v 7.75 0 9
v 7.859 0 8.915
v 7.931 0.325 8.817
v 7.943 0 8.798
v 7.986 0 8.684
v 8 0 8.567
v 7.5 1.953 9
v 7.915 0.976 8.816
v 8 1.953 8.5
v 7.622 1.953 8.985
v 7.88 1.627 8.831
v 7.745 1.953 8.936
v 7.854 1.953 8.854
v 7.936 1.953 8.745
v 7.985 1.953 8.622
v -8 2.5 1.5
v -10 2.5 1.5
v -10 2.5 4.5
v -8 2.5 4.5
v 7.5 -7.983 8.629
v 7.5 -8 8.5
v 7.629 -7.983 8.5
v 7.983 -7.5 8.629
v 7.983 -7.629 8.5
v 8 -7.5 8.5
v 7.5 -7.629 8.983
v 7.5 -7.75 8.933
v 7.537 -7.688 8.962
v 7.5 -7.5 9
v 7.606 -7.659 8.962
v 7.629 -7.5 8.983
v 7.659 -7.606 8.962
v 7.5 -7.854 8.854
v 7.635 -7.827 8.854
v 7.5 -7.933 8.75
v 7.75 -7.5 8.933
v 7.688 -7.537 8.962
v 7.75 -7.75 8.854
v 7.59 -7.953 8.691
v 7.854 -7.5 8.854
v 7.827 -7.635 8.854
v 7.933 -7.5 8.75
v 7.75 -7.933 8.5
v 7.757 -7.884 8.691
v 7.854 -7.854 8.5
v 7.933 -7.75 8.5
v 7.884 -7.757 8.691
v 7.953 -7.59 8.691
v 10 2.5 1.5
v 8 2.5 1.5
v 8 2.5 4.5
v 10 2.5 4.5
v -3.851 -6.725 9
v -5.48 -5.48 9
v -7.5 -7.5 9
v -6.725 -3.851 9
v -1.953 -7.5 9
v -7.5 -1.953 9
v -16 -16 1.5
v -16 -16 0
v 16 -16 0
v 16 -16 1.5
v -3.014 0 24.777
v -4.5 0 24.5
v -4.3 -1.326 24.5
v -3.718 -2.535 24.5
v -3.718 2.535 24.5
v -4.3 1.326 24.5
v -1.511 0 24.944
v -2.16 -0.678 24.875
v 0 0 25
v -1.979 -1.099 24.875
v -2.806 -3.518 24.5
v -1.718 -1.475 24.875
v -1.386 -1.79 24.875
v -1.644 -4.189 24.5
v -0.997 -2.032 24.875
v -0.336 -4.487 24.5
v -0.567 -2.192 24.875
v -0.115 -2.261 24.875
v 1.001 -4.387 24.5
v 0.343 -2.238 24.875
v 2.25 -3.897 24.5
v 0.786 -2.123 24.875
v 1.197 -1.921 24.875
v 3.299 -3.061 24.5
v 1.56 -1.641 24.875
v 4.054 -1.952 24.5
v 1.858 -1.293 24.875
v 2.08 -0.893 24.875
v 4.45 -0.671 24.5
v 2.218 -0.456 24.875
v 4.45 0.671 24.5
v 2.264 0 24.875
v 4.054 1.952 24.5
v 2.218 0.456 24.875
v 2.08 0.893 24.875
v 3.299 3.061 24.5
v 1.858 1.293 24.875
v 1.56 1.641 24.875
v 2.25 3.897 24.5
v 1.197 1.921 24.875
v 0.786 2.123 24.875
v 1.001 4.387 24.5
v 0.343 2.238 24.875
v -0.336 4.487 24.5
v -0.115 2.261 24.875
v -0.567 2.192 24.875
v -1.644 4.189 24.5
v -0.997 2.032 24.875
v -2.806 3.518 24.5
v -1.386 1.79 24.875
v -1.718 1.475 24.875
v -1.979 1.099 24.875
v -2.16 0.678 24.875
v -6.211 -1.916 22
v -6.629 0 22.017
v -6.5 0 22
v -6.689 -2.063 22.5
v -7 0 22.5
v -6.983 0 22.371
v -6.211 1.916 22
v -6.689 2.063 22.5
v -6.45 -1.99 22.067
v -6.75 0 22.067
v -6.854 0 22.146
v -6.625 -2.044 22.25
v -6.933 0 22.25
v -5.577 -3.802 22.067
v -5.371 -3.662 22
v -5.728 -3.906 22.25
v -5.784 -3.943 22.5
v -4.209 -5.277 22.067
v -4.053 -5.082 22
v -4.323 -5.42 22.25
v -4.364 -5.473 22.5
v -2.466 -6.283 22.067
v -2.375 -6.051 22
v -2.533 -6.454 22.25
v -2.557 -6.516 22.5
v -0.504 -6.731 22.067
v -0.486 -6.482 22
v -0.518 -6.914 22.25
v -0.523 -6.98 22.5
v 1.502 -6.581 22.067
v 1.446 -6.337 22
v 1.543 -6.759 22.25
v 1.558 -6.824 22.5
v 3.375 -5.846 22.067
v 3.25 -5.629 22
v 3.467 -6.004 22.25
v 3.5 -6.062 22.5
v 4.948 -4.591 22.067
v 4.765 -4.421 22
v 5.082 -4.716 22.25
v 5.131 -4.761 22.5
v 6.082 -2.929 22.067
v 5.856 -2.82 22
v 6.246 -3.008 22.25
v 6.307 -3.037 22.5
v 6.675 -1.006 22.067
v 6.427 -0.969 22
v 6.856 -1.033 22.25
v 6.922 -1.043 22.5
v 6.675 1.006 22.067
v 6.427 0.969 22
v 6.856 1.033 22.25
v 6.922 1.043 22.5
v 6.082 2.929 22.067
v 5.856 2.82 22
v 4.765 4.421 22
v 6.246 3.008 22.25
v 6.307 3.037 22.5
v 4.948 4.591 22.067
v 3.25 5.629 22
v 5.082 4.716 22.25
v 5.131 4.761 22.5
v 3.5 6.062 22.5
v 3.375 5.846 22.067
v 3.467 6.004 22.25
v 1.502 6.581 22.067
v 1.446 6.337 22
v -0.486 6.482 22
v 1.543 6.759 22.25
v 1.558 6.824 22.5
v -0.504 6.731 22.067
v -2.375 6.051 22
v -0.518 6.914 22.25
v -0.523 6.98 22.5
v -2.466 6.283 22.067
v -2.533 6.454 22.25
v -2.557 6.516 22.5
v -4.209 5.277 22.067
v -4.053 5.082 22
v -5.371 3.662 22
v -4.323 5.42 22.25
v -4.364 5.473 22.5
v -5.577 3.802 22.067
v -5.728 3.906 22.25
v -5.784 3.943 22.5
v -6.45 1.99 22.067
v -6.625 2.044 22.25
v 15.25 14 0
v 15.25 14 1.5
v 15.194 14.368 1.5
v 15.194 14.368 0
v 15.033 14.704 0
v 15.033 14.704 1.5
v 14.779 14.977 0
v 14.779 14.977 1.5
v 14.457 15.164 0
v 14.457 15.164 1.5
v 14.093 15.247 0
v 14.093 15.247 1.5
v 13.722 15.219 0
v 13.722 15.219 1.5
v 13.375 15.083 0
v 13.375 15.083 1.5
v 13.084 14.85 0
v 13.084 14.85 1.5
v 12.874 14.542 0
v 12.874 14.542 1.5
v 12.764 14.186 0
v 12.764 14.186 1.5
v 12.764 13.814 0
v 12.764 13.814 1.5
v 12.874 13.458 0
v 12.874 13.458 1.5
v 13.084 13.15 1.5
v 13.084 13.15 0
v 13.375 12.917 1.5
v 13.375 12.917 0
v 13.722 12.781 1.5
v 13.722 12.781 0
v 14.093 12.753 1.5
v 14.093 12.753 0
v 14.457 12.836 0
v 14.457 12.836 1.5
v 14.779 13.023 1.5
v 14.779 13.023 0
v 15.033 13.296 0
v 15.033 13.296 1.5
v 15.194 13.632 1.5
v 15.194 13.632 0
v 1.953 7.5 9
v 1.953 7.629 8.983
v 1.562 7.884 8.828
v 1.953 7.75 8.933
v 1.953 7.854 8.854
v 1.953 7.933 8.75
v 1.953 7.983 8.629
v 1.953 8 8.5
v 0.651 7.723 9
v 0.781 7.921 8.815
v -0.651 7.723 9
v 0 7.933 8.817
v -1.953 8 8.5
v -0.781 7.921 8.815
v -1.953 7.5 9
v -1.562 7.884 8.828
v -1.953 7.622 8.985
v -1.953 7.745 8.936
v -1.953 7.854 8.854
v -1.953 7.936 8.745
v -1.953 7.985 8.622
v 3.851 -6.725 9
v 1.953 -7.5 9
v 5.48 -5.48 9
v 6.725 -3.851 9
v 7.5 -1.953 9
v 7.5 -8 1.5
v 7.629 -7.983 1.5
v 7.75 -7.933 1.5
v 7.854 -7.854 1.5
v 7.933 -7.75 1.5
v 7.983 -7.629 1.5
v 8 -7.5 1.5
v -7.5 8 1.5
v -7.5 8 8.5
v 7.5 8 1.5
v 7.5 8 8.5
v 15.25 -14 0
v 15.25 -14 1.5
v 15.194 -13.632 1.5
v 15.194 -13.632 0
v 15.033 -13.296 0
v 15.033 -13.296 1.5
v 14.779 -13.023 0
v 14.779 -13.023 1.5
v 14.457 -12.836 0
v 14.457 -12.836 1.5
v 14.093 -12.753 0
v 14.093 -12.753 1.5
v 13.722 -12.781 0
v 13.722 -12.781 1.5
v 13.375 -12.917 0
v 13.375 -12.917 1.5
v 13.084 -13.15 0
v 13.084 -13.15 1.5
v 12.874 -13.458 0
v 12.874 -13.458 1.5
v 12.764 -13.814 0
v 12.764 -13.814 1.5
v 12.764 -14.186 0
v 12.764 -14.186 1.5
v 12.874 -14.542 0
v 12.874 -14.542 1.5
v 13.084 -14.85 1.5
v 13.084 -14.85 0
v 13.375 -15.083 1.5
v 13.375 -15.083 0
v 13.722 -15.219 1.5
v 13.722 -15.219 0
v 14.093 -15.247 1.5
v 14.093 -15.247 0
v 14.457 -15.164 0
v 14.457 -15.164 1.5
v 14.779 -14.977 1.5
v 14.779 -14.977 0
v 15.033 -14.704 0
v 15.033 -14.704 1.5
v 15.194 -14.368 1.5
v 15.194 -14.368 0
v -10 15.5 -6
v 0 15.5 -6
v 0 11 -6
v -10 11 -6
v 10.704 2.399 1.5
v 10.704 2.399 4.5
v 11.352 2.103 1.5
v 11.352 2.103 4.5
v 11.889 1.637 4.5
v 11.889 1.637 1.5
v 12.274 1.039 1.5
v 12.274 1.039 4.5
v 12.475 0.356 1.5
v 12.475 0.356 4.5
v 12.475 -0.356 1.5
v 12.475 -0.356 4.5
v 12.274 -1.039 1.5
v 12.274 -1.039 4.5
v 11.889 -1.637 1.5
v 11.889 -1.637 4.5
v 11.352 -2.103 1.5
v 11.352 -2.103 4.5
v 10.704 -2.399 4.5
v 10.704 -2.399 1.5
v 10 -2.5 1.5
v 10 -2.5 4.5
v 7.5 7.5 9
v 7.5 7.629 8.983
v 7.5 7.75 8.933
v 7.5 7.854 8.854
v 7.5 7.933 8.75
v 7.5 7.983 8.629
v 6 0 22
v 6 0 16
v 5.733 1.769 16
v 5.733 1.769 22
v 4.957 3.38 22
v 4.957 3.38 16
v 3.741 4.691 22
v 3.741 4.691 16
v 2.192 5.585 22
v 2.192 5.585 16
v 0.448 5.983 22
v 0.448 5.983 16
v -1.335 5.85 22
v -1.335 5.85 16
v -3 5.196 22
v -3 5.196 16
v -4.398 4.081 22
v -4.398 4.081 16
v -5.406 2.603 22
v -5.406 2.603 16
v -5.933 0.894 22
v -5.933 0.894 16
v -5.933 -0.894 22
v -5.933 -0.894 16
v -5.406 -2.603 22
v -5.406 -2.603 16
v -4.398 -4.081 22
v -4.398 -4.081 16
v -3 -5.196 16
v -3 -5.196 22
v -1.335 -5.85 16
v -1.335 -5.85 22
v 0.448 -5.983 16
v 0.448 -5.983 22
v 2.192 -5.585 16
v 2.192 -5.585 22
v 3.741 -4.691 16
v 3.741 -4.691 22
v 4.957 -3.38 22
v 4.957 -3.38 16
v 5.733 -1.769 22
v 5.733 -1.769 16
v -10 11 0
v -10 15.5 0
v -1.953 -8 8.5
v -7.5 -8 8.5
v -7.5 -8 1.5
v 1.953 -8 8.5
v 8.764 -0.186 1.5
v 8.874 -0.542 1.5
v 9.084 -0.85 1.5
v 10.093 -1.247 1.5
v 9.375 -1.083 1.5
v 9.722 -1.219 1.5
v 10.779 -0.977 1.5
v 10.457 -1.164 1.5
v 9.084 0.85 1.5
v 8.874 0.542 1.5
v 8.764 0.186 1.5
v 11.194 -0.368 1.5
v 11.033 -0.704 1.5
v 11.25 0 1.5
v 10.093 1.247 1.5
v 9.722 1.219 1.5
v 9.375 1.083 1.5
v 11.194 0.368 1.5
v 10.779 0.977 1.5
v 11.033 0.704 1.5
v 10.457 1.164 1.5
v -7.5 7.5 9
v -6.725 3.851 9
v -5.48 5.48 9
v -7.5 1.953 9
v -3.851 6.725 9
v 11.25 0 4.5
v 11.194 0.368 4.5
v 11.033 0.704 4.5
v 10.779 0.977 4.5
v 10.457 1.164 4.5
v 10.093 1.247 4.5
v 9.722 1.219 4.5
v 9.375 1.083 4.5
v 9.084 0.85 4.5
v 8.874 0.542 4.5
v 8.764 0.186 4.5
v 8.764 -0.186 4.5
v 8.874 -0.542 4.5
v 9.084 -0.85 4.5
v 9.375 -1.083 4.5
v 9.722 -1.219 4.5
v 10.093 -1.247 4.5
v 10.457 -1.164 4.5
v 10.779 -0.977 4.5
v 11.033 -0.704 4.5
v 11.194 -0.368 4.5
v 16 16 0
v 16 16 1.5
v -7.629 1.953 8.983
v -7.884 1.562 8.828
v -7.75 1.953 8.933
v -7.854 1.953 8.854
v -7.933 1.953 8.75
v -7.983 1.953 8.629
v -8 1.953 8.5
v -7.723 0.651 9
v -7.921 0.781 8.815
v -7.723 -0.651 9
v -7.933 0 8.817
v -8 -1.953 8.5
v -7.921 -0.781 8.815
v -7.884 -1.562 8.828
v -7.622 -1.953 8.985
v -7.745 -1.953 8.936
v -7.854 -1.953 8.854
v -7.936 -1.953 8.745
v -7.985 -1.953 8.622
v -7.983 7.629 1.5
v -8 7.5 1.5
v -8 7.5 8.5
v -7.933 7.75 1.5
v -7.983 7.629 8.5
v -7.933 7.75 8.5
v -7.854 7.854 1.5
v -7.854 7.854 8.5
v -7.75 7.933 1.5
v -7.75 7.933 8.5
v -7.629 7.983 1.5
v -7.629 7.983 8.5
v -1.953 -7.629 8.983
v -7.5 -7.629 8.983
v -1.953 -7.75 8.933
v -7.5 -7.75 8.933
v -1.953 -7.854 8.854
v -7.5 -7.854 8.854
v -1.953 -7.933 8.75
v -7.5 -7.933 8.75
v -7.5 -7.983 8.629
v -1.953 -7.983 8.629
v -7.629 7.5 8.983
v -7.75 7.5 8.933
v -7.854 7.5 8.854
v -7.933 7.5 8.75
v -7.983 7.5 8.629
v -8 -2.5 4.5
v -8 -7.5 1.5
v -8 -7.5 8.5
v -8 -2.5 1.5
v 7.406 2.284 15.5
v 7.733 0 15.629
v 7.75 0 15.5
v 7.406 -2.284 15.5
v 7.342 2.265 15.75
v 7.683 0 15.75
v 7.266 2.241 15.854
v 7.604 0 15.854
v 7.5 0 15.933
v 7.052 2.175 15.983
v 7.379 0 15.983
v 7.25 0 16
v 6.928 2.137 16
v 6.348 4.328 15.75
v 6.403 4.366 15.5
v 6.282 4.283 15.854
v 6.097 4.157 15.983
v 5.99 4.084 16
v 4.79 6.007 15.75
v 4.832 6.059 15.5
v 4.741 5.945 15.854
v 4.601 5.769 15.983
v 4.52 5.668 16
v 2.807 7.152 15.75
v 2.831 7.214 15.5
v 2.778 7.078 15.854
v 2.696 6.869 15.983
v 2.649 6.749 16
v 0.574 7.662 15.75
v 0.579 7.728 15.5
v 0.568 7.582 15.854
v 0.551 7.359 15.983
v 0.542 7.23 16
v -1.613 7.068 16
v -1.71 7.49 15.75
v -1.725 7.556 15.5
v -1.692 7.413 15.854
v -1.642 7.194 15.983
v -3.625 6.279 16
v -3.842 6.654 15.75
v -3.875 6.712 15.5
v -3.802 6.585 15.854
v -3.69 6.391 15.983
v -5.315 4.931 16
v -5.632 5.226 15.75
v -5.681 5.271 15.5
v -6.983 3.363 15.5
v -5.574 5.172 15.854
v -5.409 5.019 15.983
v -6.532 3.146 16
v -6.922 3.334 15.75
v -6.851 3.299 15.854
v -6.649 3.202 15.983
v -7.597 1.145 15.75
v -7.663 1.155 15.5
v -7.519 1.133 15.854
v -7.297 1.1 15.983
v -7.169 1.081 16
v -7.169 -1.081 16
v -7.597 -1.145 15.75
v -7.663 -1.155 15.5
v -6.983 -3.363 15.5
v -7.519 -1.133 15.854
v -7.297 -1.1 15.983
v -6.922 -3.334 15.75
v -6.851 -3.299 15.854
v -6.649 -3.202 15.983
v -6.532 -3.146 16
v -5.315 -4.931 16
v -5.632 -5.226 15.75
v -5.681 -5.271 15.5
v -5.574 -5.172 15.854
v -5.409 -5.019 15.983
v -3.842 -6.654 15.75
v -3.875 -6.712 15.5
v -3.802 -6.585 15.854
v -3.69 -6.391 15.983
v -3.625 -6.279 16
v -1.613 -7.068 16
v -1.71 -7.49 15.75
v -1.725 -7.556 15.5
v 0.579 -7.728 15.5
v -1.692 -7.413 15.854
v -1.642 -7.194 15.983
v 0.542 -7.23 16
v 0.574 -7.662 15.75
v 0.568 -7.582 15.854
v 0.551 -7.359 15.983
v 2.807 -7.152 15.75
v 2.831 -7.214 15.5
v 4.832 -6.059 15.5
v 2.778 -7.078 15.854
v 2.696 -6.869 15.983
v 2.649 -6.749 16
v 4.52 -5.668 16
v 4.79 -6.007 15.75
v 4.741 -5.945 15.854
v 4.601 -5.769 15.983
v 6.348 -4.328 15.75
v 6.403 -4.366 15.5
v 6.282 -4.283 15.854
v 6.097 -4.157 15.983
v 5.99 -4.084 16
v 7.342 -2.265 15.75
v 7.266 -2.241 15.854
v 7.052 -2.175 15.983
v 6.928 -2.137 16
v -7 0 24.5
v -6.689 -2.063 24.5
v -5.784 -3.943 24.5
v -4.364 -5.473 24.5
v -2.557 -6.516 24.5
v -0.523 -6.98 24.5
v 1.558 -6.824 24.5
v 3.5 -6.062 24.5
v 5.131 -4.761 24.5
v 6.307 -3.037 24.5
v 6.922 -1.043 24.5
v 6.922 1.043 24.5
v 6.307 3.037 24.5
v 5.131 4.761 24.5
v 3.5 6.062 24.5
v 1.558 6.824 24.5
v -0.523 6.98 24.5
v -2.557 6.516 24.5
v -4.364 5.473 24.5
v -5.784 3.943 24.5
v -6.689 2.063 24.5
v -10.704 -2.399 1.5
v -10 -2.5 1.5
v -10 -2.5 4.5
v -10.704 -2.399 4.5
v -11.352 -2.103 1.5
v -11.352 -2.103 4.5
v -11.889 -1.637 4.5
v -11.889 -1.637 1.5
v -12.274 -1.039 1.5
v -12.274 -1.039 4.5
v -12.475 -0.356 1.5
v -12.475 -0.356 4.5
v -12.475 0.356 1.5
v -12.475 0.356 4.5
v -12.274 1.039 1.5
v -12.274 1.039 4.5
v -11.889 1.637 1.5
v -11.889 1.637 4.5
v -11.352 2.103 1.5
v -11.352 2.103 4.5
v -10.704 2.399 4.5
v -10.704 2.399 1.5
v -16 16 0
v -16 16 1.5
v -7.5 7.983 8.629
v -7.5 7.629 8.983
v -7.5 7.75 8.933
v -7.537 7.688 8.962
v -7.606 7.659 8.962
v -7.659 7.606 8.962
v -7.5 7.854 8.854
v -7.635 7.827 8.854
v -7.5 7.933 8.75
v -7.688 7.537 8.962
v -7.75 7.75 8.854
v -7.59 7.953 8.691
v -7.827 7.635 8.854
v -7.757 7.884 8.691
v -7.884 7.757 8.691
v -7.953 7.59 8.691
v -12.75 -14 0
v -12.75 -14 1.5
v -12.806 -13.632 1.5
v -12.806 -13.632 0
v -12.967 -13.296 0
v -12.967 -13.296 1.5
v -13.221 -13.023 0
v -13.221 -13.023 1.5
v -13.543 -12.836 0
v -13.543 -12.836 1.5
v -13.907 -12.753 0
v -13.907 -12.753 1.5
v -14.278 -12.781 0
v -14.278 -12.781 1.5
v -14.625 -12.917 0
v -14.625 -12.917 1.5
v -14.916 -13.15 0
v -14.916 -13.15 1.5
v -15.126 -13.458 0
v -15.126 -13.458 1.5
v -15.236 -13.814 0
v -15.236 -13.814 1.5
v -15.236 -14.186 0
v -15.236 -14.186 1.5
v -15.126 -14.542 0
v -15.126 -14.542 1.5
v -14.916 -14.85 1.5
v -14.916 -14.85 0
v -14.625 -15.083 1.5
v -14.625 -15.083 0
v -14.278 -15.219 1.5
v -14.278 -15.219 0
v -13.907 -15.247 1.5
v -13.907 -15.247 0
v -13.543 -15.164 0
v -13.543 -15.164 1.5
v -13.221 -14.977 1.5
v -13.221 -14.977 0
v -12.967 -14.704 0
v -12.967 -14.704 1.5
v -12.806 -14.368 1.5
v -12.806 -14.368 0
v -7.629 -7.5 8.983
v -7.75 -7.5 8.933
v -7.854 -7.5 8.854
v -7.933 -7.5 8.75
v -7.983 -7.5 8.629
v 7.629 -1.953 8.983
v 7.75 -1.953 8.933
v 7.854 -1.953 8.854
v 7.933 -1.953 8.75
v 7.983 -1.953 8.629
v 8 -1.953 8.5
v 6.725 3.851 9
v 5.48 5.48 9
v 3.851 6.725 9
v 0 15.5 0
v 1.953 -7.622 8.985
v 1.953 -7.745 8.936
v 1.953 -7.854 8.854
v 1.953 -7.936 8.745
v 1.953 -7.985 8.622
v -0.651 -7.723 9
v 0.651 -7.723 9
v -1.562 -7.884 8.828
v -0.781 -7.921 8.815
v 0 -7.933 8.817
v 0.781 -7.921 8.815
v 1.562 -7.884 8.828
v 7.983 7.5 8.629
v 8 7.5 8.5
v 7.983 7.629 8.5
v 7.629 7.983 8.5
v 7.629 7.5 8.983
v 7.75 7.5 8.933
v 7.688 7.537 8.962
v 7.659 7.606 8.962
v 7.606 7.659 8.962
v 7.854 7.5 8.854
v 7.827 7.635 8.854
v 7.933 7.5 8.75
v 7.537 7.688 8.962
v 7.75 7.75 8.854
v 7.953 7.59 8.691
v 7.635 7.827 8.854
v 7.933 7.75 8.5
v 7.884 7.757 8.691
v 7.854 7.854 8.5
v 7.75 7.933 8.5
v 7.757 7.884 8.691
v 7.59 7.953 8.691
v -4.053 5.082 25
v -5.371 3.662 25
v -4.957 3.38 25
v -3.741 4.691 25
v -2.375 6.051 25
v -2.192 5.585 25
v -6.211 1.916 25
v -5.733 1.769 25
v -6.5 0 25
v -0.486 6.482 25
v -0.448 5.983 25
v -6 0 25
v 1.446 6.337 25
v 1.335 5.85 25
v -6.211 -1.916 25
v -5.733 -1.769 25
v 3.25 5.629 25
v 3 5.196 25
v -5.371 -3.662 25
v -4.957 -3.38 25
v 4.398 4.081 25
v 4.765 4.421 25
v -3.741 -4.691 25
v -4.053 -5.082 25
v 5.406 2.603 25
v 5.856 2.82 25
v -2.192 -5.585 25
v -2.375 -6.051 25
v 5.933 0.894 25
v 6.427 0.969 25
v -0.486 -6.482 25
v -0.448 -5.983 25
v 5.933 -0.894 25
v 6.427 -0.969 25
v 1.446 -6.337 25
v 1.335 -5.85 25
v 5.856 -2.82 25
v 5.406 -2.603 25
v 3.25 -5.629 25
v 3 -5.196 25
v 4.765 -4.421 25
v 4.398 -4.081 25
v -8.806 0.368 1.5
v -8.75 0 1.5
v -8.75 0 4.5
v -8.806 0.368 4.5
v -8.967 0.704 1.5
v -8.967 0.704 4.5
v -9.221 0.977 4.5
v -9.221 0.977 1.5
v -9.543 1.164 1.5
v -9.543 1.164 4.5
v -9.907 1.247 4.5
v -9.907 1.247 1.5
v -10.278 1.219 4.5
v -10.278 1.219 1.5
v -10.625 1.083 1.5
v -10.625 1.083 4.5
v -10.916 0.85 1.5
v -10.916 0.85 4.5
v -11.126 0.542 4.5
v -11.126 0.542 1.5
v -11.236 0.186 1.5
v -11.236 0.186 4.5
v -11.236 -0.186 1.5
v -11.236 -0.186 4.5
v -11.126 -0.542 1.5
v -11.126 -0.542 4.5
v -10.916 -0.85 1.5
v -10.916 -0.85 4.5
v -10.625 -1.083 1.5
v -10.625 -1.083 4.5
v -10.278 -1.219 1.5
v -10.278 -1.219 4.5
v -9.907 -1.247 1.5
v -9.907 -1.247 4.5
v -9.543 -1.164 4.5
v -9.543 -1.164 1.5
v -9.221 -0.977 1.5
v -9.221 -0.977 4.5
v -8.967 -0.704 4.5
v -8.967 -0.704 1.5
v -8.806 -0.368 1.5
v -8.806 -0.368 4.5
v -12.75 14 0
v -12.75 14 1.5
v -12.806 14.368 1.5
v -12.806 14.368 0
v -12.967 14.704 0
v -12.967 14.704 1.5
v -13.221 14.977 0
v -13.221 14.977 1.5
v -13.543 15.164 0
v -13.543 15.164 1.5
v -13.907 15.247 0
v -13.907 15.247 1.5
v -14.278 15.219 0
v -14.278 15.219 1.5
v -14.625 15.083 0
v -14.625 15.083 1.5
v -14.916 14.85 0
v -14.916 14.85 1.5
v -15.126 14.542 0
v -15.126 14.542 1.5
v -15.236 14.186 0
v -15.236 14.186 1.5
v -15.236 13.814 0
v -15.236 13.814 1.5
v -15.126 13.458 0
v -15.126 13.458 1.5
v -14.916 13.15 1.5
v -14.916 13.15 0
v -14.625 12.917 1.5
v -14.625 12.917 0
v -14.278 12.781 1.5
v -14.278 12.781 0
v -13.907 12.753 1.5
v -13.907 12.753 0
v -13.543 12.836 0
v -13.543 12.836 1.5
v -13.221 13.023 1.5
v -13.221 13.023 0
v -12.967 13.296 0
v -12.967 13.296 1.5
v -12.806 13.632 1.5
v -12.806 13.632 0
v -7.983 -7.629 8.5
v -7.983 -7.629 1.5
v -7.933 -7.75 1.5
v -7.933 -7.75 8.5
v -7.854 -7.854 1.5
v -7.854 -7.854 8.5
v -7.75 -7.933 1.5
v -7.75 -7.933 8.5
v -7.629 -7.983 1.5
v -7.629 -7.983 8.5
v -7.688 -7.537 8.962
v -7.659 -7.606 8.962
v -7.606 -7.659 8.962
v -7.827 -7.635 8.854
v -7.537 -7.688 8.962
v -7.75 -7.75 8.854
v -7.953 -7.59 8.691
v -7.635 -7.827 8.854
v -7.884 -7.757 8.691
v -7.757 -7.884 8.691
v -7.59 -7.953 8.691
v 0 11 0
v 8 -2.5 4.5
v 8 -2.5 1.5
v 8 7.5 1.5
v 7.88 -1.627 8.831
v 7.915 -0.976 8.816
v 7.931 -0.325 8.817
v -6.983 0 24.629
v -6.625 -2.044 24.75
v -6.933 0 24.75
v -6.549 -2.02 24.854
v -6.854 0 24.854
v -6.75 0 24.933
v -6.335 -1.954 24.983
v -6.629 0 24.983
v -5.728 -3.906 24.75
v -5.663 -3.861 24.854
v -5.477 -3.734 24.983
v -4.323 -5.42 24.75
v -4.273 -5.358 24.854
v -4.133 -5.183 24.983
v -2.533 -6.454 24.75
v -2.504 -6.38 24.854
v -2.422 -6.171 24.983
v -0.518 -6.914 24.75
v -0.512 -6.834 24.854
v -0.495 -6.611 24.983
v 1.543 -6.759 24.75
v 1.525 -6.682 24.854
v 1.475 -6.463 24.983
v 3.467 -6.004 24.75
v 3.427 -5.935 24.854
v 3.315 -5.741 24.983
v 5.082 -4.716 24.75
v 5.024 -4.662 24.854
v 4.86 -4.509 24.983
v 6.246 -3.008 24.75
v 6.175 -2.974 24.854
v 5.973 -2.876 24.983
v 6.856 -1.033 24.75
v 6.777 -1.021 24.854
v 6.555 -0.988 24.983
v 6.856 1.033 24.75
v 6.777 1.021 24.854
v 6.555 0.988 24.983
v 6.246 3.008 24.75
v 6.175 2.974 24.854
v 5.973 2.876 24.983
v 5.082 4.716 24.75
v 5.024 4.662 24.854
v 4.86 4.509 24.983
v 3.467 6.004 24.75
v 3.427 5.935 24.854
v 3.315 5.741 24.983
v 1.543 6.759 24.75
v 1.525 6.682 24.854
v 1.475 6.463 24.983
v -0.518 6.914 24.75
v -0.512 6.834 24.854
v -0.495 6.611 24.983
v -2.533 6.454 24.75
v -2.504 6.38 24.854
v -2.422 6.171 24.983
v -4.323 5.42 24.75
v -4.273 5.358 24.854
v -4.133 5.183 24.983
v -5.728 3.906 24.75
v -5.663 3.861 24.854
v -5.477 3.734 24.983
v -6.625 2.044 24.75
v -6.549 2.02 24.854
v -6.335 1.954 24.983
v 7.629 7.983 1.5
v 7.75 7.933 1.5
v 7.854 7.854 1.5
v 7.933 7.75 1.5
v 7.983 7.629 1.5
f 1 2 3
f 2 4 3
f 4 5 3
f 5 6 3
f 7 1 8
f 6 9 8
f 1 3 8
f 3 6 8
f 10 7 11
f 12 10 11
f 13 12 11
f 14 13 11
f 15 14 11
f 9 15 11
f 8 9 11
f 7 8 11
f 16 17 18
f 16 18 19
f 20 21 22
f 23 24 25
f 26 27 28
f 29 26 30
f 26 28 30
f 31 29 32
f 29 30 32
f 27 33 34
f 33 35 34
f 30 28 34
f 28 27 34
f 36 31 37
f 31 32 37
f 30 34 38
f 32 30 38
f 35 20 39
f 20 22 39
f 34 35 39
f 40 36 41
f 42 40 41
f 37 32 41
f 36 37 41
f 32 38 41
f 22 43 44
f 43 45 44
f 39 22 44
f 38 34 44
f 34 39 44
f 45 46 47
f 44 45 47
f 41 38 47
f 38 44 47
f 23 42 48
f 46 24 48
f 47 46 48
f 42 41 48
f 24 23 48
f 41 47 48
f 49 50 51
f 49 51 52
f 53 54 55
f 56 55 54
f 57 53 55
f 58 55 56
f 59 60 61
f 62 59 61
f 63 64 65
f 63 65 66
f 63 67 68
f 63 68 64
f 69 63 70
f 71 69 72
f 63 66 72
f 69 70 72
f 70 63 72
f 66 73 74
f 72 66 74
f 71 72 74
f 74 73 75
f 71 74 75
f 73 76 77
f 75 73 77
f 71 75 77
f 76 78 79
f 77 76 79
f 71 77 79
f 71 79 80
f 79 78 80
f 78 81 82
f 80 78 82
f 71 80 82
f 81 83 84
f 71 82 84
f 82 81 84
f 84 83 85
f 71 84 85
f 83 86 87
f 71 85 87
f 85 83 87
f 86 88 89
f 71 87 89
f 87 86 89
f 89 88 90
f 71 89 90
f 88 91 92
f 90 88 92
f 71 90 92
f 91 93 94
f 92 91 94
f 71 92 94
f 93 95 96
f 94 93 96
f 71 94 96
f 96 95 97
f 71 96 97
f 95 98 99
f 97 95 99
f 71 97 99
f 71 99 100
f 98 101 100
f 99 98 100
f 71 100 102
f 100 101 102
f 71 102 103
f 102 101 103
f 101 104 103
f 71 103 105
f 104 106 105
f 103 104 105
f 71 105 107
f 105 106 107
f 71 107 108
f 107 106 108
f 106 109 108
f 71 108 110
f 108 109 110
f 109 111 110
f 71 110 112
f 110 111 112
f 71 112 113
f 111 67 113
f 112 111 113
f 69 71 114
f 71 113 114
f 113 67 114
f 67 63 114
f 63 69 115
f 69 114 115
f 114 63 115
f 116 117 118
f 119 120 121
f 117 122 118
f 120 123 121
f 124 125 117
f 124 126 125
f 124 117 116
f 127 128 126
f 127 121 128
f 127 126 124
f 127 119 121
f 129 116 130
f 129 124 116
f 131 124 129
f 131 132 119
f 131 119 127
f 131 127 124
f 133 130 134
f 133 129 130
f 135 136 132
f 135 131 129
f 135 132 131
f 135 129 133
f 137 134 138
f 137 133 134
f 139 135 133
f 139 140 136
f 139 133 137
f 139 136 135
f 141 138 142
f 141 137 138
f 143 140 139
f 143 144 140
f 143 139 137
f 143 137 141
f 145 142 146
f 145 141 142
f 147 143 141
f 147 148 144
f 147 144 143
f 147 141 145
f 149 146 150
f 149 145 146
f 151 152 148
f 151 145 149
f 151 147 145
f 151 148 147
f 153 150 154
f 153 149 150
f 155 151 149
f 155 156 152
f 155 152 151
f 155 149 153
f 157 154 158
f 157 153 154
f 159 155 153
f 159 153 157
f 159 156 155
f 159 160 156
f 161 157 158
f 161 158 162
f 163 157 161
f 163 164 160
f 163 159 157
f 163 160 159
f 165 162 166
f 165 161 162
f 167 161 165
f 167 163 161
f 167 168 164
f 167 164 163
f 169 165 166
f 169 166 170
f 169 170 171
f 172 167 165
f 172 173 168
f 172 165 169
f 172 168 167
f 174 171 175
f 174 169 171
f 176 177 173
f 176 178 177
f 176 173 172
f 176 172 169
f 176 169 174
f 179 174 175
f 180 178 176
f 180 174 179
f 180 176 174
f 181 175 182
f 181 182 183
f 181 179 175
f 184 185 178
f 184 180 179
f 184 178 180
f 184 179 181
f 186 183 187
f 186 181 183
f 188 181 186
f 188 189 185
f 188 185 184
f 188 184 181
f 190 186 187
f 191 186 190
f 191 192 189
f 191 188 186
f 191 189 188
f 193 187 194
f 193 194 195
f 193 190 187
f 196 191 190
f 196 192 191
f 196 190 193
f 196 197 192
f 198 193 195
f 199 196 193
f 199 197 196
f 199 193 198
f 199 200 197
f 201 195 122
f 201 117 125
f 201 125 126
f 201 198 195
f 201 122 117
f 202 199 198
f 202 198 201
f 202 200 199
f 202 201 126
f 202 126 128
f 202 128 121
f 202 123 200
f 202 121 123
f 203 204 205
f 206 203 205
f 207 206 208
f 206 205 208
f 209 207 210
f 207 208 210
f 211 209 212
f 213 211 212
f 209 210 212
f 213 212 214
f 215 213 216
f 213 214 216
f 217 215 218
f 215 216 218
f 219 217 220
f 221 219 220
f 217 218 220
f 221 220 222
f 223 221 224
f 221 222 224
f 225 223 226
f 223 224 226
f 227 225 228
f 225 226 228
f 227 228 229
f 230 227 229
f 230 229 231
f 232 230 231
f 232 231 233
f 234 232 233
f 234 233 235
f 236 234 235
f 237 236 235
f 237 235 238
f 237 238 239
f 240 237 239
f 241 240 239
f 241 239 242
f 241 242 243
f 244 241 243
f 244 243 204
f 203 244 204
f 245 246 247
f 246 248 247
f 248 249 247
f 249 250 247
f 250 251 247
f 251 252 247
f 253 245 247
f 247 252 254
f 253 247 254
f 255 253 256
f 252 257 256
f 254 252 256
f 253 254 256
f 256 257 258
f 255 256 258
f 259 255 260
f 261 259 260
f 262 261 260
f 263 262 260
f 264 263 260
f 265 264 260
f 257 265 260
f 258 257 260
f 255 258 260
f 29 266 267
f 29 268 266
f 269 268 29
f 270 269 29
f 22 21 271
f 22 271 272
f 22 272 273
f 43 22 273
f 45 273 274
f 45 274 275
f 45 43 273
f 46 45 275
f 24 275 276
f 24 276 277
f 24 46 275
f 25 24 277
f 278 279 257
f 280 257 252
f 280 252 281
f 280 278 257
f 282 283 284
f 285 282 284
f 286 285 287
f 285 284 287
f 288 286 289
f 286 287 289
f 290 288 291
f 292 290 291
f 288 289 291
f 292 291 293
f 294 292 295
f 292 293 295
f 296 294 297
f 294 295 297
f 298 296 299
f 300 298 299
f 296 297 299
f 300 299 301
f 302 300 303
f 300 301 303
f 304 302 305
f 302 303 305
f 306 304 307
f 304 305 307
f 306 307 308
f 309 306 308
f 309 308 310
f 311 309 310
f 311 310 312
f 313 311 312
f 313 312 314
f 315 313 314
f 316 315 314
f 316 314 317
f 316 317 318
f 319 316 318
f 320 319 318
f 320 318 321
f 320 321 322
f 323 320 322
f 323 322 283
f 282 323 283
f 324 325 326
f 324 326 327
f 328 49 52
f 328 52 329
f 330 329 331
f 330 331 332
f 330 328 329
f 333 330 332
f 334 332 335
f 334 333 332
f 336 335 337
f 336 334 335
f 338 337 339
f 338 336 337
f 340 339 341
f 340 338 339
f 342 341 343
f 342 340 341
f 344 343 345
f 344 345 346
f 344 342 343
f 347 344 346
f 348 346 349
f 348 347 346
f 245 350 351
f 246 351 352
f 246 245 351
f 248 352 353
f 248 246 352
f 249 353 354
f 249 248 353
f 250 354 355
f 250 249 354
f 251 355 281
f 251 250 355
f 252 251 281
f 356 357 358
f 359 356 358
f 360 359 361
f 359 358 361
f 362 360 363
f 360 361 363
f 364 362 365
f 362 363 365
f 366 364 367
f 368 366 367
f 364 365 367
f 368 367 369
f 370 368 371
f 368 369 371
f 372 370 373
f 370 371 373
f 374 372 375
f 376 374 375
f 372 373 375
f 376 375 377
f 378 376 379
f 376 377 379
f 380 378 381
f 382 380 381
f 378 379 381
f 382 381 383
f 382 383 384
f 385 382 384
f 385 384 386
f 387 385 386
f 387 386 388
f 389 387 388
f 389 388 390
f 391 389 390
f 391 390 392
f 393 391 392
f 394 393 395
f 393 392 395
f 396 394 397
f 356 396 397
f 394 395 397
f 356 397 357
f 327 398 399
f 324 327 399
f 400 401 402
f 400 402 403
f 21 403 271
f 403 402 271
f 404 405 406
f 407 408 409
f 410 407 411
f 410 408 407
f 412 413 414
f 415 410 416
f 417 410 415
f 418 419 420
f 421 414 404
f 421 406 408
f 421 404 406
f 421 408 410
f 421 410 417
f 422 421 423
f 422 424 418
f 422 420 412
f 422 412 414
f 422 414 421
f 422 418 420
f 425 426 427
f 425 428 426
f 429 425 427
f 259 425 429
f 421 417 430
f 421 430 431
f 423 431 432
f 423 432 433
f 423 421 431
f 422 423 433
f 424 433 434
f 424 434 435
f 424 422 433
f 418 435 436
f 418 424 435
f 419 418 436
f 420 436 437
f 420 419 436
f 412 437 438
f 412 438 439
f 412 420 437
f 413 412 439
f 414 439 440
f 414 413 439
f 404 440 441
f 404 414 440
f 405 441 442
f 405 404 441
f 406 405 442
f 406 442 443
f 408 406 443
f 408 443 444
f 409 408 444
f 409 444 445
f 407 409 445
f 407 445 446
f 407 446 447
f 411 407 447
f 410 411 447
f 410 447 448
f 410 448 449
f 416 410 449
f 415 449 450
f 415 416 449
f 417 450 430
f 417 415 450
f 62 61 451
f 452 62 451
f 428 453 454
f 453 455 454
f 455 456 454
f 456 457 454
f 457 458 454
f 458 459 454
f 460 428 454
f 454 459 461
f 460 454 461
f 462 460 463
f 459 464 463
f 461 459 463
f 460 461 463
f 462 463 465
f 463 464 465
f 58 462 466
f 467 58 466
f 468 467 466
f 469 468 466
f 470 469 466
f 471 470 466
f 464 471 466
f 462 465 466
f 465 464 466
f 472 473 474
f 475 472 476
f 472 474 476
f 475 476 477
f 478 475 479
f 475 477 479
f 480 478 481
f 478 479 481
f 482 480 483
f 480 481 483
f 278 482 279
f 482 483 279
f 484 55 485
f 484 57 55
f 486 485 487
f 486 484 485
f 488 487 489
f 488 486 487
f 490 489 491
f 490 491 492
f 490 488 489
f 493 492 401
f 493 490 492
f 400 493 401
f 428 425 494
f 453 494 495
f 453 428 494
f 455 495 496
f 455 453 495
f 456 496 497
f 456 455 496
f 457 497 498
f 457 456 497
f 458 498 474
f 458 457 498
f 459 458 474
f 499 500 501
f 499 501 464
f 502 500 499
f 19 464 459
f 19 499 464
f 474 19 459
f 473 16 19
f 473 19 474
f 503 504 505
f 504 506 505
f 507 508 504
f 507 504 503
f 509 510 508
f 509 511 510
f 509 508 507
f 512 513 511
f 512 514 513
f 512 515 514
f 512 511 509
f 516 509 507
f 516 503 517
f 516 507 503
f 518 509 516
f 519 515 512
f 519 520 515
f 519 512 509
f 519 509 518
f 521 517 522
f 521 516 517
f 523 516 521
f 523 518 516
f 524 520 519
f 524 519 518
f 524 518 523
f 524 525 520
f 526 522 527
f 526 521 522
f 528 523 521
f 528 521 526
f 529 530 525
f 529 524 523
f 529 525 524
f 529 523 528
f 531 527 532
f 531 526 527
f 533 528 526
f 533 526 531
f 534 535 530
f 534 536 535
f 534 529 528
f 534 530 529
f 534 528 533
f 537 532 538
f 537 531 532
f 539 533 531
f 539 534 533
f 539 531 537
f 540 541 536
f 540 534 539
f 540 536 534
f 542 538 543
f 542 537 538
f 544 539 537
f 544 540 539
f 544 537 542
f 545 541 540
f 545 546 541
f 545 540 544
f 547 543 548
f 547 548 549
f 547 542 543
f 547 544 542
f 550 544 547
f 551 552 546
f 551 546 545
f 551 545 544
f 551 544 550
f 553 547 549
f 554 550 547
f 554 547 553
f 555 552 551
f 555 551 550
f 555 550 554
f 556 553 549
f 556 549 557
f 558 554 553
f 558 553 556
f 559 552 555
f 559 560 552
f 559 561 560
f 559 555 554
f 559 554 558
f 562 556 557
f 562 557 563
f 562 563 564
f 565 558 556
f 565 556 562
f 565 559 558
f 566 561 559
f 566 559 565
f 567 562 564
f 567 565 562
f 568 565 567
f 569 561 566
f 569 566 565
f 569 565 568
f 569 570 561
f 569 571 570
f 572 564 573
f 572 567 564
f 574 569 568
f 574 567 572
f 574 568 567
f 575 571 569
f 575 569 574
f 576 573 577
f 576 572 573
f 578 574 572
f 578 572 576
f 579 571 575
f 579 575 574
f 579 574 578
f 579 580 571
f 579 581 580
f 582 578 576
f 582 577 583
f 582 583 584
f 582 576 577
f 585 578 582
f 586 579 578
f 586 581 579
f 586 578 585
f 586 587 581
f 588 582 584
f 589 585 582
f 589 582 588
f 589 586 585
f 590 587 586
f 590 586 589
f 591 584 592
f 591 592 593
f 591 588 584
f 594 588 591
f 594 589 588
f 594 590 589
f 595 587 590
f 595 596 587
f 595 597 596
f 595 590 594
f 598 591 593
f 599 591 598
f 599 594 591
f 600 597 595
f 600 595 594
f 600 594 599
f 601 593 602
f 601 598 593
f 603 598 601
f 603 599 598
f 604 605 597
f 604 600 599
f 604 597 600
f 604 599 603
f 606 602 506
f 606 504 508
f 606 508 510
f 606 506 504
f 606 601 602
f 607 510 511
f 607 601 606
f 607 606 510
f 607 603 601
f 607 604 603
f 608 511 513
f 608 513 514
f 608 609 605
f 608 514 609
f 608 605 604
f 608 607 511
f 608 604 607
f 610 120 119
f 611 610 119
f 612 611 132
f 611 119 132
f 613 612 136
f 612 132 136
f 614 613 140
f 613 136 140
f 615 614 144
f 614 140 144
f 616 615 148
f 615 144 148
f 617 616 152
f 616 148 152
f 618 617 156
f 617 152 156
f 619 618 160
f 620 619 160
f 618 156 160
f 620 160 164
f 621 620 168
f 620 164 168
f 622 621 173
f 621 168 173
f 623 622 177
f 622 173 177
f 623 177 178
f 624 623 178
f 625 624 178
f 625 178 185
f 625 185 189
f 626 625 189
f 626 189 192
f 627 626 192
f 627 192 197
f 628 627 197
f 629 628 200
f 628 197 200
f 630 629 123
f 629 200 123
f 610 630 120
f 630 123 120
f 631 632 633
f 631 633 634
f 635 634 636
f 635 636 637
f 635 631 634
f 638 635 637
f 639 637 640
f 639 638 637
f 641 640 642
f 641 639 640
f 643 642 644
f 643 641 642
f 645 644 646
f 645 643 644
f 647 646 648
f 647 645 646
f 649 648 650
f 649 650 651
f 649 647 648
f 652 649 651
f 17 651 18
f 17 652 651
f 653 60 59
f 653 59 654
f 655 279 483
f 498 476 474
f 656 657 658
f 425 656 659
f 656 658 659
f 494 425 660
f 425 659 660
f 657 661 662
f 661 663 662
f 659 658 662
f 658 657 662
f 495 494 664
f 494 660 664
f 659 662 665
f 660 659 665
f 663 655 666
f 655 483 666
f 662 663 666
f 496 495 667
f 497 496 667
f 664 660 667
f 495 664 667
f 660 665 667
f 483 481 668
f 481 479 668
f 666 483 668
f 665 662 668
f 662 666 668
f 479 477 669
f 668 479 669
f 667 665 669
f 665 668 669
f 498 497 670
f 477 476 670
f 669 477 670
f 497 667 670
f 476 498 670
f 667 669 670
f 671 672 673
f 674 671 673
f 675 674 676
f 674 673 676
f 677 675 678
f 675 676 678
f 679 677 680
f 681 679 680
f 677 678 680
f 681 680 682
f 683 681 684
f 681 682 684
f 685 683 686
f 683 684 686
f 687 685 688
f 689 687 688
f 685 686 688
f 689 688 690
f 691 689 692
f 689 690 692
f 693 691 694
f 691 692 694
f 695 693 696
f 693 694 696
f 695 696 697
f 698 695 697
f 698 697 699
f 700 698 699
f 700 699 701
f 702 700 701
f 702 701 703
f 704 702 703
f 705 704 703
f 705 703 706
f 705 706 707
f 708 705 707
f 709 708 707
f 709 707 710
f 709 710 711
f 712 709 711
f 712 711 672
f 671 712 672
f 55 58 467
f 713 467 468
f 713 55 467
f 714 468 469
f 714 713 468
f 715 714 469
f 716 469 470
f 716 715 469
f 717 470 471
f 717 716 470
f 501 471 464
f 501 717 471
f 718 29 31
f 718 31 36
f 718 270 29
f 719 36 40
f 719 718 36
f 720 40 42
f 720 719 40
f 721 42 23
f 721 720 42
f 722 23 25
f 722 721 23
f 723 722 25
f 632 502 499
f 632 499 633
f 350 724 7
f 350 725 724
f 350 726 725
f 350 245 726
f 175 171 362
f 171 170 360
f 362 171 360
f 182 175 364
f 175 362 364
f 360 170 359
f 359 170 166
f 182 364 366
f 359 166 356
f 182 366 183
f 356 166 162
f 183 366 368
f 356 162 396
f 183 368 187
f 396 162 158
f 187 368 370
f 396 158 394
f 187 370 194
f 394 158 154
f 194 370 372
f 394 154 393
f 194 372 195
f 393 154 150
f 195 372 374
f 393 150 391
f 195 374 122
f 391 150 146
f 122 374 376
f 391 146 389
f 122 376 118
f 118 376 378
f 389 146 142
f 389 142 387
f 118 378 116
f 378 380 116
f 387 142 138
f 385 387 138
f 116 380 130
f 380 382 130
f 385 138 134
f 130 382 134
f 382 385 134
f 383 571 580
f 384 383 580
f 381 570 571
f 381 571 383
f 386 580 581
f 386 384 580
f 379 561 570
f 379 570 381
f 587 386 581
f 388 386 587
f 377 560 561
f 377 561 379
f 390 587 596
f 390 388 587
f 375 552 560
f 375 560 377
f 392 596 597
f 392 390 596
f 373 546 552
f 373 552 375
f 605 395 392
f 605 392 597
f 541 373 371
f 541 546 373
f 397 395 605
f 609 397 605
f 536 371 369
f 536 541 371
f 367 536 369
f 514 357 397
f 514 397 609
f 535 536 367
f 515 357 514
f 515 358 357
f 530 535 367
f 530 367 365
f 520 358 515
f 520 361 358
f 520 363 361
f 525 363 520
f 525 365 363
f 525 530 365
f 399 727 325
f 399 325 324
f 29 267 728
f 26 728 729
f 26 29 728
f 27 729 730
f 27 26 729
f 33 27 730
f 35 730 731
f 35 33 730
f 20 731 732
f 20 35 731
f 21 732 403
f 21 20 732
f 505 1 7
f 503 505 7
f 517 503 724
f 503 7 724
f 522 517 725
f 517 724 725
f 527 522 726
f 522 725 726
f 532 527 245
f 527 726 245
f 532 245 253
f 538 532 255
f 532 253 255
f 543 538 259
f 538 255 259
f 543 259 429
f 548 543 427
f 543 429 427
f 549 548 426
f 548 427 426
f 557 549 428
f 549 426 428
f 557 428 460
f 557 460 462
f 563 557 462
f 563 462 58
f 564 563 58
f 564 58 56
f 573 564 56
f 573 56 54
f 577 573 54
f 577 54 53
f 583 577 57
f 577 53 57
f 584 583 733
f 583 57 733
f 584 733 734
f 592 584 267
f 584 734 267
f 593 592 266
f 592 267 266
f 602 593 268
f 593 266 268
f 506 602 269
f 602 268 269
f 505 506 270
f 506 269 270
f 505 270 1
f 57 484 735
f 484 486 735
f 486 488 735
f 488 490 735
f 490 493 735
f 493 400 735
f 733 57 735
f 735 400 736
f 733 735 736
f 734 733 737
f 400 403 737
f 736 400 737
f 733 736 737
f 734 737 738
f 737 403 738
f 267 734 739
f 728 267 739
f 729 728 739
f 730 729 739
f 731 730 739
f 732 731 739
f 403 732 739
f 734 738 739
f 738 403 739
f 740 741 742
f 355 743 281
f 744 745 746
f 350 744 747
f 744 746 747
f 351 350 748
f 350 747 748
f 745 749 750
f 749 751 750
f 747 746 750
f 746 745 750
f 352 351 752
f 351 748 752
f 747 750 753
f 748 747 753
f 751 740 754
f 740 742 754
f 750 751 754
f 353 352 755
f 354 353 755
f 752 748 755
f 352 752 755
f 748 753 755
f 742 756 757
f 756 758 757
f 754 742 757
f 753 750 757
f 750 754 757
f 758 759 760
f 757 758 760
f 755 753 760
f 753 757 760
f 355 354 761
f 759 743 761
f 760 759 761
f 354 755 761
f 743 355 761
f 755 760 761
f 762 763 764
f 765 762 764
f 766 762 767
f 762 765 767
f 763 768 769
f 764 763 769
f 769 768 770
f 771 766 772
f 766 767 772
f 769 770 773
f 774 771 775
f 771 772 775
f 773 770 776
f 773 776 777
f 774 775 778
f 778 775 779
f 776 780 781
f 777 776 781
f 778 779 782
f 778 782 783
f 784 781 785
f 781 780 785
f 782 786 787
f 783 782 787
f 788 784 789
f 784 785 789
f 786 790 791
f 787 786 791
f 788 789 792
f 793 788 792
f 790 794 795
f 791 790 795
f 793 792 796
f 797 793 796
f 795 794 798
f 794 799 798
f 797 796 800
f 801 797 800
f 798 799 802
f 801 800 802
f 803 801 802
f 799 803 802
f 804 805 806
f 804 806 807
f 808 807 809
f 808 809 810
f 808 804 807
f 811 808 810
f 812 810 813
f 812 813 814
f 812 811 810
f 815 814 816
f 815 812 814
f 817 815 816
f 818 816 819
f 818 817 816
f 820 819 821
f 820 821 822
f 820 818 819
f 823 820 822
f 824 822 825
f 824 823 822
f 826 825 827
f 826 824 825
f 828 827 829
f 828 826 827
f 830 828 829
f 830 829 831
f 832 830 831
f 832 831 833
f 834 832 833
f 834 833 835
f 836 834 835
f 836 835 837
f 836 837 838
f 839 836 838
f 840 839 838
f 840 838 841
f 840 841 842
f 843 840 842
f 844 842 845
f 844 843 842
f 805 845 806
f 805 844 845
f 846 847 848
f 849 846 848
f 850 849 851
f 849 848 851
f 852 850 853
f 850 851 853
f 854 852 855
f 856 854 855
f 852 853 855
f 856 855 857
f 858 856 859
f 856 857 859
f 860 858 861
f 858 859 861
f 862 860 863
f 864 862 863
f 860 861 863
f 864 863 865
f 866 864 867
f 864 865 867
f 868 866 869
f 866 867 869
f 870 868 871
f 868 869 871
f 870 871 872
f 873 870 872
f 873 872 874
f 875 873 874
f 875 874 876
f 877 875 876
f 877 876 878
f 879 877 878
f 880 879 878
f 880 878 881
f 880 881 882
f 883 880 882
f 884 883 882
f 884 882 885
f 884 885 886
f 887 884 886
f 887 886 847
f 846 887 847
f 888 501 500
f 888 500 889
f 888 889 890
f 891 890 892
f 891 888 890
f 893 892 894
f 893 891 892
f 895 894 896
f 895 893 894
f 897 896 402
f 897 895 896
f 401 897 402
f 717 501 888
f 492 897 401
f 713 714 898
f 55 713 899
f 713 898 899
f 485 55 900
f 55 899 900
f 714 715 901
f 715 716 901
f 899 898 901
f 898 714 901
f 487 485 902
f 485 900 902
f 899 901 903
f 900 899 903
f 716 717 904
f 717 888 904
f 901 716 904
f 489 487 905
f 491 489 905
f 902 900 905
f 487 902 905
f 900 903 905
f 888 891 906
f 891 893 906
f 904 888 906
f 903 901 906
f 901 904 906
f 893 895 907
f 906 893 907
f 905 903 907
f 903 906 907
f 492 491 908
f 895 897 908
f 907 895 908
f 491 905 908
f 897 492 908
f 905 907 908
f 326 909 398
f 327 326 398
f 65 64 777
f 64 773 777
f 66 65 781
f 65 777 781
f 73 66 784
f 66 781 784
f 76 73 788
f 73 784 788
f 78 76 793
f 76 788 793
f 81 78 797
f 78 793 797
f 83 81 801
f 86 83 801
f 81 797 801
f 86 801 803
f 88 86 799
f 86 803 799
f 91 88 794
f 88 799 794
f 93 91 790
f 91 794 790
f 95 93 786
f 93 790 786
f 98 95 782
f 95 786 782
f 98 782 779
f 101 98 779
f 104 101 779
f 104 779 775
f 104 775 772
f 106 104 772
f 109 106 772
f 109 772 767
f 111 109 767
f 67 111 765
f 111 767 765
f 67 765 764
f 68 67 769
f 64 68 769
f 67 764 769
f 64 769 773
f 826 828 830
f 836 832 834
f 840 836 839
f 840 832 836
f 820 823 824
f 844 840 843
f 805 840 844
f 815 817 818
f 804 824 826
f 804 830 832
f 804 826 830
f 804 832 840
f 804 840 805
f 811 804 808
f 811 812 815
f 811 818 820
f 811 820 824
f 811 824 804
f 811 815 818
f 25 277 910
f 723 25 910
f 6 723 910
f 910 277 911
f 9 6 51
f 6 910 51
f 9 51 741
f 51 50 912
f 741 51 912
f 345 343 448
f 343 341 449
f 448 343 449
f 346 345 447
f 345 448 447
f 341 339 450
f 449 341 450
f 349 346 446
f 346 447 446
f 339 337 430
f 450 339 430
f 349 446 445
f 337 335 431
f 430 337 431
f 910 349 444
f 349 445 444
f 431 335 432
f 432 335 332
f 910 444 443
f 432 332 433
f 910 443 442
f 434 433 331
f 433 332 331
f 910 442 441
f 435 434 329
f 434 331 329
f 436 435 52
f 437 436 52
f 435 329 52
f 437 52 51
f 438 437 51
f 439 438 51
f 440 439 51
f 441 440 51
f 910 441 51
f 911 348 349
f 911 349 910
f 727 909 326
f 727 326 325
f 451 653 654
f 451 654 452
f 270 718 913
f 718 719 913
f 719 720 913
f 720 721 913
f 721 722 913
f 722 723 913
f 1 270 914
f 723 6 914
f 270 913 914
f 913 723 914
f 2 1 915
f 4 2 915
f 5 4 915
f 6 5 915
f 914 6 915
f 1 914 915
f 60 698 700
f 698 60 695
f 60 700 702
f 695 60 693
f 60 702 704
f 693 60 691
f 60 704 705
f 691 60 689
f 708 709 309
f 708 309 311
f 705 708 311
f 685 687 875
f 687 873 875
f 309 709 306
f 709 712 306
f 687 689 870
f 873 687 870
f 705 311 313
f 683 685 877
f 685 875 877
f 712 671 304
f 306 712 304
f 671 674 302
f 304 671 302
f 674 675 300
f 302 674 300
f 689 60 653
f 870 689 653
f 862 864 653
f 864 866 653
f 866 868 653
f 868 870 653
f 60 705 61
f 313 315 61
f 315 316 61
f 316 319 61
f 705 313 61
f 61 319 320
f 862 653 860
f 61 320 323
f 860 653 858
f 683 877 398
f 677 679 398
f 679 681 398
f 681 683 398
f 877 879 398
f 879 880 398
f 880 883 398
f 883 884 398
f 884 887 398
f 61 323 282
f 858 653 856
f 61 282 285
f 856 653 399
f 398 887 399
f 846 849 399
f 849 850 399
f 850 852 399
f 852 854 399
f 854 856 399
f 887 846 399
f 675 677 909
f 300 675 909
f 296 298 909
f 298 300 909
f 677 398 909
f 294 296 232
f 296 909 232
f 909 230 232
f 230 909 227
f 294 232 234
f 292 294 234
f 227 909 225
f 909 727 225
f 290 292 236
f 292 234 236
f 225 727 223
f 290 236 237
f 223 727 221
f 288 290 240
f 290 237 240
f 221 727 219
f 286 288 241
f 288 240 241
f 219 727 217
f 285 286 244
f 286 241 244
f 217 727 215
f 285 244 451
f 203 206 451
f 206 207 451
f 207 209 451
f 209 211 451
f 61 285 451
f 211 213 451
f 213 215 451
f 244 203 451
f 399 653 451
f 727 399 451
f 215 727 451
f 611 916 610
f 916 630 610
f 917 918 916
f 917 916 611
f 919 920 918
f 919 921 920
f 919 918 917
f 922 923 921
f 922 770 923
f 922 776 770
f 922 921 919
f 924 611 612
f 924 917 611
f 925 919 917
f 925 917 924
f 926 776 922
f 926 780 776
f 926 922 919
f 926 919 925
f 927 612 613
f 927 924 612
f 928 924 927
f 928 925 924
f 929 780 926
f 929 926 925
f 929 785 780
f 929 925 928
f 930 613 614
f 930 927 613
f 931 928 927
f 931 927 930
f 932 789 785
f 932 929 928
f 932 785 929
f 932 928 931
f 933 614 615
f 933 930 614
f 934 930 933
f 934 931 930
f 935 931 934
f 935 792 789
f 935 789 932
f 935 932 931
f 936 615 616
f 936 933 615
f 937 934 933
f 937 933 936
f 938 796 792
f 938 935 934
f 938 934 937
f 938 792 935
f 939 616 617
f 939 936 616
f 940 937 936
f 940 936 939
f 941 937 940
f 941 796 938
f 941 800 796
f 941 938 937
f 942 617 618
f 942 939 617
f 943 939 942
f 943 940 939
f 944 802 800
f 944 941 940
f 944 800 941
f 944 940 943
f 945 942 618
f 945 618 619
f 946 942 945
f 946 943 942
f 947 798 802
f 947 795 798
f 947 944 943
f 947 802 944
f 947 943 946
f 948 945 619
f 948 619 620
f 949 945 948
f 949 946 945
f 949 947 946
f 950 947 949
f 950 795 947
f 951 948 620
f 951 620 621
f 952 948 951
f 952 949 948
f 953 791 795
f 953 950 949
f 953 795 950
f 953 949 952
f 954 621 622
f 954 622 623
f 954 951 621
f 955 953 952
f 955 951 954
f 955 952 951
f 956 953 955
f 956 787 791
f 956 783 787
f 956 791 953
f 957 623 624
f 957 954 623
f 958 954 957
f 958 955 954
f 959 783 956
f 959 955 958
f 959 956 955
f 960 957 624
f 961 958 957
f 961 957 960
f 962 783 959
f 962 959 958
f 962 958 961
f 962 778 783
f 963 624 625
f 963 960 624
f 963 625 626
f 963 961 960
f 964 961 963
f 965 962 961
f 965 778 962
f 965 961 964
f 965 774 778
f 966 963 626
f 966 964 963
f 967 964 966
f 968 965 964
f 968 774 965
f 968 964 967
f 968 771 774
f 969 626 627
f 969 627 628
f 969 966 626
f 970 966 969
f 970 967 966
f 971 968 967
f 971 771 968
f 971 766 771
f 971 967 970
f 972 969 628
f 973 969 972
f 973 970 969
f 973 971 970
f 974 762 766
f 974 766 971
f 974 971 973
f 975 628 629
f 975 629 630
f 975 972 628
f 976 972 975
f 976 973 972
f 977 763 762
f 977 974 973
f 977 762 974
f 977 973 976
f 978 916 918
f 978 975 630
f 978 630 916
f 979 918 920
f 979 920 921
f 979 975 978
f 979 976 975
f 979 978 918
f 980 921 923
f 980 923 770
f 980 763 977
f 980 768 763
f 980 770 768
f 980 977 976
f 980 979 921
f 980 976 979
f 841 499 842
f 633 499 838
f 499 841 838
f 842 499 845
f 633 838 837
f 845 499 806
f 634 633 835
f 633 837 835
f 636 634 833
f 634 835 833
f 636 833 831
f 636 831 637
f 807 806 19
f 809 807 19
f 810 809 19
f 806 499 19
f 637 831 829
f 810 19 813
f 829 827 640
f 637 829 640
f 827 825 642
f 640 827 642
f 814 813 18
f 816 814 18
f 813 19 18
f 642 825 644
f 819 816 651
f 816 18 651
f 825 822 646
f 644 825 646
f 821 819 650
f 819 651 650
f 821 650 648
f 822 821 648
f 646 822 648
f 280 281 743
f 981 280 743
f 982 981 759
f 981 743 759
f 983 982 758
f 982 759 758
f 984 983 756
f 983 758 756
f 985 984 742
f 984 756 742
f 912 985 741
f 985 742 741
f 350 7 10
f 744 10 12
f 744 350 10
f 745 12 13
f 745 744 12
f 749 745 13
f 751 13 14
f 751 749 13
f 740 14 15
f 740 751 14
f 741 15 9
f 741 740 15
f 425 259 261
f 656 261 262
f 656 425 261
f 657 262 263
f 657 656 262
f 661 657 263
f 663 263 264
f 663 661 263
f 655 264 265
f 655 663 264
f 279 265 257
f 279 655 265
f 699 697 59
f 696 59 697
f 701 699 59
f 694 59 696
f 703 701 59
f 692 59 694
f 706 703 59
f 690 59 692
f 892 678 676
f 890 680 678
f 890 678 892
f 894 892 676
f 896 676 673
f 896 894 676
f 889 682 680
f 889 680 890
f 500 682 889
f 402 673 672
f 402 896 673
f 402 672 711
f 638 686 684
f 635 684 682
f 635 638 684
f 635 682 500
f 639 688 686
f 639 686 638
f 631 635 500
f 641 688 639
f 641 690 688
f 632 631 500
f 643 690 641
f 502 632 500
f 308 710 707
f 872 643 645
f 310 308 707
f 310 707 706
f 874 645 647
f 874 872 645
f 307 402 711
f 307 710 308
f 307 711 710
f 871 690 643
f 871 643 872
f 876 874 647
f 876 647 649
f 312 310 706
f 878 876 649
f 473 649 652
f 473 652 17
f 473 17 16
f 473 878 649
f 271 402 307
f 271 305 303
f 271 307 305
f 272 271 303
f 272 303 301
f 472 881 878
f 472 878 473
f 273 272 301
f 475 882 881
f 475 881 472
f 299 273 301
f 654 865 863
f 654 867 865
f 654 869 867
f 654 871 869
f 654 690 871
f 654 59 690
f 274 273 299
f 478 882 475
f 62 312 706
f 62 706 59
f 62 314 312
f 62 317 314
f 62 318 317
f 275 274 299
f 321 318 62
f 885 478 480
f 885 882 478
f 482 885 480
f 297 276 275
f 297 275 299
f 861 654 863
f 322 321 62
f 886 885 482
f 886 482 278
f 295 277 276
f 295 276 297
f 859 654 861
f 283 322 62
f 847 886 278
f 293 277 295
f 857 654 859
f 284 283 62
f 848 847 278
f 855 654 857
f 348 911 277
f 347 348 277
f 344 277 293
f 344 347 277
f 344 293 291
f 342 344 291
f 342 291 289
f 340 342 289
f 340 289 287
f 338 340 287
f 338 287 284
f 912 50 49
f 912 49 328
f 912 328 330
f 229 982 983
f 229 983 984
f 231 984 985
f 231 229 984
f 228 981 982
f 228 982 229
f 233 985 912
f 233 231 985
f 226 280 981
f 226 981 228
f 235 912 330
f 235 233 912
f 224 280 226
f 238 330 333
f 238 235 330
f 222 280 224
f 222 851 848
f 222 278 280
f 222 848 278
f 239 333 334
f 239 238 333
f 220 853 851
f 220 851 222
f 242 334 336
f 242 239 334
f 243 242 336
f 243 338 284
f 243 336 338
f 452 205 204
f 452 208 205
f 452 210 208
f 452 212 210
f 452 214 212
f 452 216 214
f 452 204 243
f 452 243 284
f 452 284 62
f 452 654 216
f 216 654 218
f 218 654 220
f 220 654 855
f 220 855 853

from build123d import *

# Parameters (mm, degrees)
SKETCH1_W           = 32
SKETCH1_H           = 32
BOSS_EXTRUDE1_DEPTH = 1.5
SKETCH2_R           = 1.25
CUT_EXTRUDE1_DEPTH  = 2.5
SKETCH3_W           = 16
SKETCH3_H           = 16
BOSS_EXTRUDE2_DEPTH = 7.5
SKETCH4_R           = 1.25
BOSS_EXTRUDE3_DEPTH = 3
SKETCH5_R           = 7.75
BOSS_EXTRUDE4_DEPTH = 7
SKETCH6_R           = 6
BOSS_EXTRUDE5_DEPTH = 6
SKETCH9_W           = 10
SKETCH9_H           = 4.5
BOSS_EXTRUDE6_DEPTH = 6
FILLET1_R           = 0.5
FILLET2_R           = 0.5


with BuildPart() as part:
    # Sketch1 → Boss-Extrude1 (new body)
    with BuildSketch(Plane.XY):
        Rectangle(SKETCH1_W, SKETCH1_H)
    extrude(amount=BOSS_EXTRUDE1_DEPTH)

    # Sketch2 → Cut-Extrude1 (cut, through all)
    with BuildSketch(Plane.XY.offset(1.5)):
        with Locations((-14, 14)):
            Circle(SKETCH2_R)
        with Locations((14, 14)):
            Circle(SKETCH2_R)
        with Locations((14, -14)):
            Circle(SKETCH2_R)
        with Locations((-14, -14)):
            Circle(SKETCH2_R)
    extrude(amount=-CUT_EXTRUDE1_DEPTH, mode=Mode.SUBTRACT)

    # Sketch3 → Boss-Extrude2 (add)
    with BuildSketch(Plane.XY.offset(1.5)):
        Rectangle(SKETCH3_W, SKETCH3_H)
    extrude(amount=BOSS_EXTRUDE2_DEPTH)

    # Sketch4 → Boss-Extrude3 (add)
    with BuildSketch(Plane.XY.offset(1.5)):
        with BuildLine():
            Line((-10, 2.5), (-8, 2.5))
            Line((-8, 2.5), (-8, -2.5))
            Line((-8, -2.5), (-10, -2.5))
            ThreePointArc((-10, -2.5), (-12.5, 0), (-10, 2.5))
        make_face()
        with Locations((-10, 0)):
            Circle(SKETCH4_R, mode=Mode.SUBTRACT)
        with BuildLine():
            Line((10, -2.5), (8, -2.5))
            Line((8, -2.5), (8, 2.5))
            Line((8, 2.5), (10, 2.5))
            ThreePointArc((10, 2.5), (12.5, 0), (10, -2.5))
        make_face()
        with Locations((10, 0)):
            Circle(SKETCH4_R, mode=Mode.SUBTRACT)
    extrude(amount=BOSS_EXTRUDE3_DEPTH)

    # Sketch5 → Boss-Extrude4 (add)
    with BuildSketch(Plane.XY.offset(9)):
        Circle(SKETCH5_R)
    extrude(amount=BOSS_EXTRUDE4_DEPTH)

    # Sketch6 → Boss-Extrude5 (add)
    with BuildSketch(Plane.XY.offset(16)):
        Circle(SKETCH6_R)
    extrude(amount=BOSS_EXTRUDE5_DEPTH)

    # Sketch8 → Revolve1 (revolve)
    with BuildSketch(Plane(origin=(0, 0, 0), x_dir=(1, 0, 0), z_dir=(0, 1, 0))):
        with BuildLine():
            ThreePointArc((0, -25), (-2.263846285, -24.874616561), (-4.5, -24.5))
            Line((-4.5, -24.5), (-6, -25))
            Line((-6, -25), (-7, -25))
            Line((-7, -25), (-7, -22))
            Line((-7, -22), (0, -22))
            Line((0, -22), (0, -25))
        make_face()
    revolve(axis=Axis((0, 0, 22), (0, 0, 1)))

    # Sketch9 → Boss-Extrude6 (add)
    with BuildSketch(Plane(origin=(0, 0, 0), x_dir=(-1, 0, 0), z_dir=(0, 0, -1))):
        with Locations((5, 13.25)):
            Rectangle(SKETCH9_W, SKETCH9_H)
    extrude(amount=BOSS_EXTRUDE6_DEPTH)

    # Fillet1
    fillet1_edges = [part.edges().sort_by_distance(p)[0] for p in [
        (-8, 8, 5.25),
        (-8, -8, 5.25),
        (8, -8, 5.25),
        (8, 8, 5.25),
    ]]
    fillet(fillet1_edges, radius=FILLET1_R)

    # Fillet2
    fillet2_edges = [part.edges().sort_by_distance(p)[0] for p in [
        (0, -8, 9),
        (-8, 0, 9),
        (8, 0, 9),
        (0, 8, 9),
        (7.853553391, 7.853553391, 9),
        (7.853553391, -7.853553391, 9),
        (-7.853553391, 7.853553391, 9),
        (-7.853553391, -7.853553391, 9),
        (-7.75, 0, 16),
        (7, 0, 22),
        (7, 0, 25),
    ]]
    fillet(fillet2_edges, radius=FILLET2_R)


solid = part.part
